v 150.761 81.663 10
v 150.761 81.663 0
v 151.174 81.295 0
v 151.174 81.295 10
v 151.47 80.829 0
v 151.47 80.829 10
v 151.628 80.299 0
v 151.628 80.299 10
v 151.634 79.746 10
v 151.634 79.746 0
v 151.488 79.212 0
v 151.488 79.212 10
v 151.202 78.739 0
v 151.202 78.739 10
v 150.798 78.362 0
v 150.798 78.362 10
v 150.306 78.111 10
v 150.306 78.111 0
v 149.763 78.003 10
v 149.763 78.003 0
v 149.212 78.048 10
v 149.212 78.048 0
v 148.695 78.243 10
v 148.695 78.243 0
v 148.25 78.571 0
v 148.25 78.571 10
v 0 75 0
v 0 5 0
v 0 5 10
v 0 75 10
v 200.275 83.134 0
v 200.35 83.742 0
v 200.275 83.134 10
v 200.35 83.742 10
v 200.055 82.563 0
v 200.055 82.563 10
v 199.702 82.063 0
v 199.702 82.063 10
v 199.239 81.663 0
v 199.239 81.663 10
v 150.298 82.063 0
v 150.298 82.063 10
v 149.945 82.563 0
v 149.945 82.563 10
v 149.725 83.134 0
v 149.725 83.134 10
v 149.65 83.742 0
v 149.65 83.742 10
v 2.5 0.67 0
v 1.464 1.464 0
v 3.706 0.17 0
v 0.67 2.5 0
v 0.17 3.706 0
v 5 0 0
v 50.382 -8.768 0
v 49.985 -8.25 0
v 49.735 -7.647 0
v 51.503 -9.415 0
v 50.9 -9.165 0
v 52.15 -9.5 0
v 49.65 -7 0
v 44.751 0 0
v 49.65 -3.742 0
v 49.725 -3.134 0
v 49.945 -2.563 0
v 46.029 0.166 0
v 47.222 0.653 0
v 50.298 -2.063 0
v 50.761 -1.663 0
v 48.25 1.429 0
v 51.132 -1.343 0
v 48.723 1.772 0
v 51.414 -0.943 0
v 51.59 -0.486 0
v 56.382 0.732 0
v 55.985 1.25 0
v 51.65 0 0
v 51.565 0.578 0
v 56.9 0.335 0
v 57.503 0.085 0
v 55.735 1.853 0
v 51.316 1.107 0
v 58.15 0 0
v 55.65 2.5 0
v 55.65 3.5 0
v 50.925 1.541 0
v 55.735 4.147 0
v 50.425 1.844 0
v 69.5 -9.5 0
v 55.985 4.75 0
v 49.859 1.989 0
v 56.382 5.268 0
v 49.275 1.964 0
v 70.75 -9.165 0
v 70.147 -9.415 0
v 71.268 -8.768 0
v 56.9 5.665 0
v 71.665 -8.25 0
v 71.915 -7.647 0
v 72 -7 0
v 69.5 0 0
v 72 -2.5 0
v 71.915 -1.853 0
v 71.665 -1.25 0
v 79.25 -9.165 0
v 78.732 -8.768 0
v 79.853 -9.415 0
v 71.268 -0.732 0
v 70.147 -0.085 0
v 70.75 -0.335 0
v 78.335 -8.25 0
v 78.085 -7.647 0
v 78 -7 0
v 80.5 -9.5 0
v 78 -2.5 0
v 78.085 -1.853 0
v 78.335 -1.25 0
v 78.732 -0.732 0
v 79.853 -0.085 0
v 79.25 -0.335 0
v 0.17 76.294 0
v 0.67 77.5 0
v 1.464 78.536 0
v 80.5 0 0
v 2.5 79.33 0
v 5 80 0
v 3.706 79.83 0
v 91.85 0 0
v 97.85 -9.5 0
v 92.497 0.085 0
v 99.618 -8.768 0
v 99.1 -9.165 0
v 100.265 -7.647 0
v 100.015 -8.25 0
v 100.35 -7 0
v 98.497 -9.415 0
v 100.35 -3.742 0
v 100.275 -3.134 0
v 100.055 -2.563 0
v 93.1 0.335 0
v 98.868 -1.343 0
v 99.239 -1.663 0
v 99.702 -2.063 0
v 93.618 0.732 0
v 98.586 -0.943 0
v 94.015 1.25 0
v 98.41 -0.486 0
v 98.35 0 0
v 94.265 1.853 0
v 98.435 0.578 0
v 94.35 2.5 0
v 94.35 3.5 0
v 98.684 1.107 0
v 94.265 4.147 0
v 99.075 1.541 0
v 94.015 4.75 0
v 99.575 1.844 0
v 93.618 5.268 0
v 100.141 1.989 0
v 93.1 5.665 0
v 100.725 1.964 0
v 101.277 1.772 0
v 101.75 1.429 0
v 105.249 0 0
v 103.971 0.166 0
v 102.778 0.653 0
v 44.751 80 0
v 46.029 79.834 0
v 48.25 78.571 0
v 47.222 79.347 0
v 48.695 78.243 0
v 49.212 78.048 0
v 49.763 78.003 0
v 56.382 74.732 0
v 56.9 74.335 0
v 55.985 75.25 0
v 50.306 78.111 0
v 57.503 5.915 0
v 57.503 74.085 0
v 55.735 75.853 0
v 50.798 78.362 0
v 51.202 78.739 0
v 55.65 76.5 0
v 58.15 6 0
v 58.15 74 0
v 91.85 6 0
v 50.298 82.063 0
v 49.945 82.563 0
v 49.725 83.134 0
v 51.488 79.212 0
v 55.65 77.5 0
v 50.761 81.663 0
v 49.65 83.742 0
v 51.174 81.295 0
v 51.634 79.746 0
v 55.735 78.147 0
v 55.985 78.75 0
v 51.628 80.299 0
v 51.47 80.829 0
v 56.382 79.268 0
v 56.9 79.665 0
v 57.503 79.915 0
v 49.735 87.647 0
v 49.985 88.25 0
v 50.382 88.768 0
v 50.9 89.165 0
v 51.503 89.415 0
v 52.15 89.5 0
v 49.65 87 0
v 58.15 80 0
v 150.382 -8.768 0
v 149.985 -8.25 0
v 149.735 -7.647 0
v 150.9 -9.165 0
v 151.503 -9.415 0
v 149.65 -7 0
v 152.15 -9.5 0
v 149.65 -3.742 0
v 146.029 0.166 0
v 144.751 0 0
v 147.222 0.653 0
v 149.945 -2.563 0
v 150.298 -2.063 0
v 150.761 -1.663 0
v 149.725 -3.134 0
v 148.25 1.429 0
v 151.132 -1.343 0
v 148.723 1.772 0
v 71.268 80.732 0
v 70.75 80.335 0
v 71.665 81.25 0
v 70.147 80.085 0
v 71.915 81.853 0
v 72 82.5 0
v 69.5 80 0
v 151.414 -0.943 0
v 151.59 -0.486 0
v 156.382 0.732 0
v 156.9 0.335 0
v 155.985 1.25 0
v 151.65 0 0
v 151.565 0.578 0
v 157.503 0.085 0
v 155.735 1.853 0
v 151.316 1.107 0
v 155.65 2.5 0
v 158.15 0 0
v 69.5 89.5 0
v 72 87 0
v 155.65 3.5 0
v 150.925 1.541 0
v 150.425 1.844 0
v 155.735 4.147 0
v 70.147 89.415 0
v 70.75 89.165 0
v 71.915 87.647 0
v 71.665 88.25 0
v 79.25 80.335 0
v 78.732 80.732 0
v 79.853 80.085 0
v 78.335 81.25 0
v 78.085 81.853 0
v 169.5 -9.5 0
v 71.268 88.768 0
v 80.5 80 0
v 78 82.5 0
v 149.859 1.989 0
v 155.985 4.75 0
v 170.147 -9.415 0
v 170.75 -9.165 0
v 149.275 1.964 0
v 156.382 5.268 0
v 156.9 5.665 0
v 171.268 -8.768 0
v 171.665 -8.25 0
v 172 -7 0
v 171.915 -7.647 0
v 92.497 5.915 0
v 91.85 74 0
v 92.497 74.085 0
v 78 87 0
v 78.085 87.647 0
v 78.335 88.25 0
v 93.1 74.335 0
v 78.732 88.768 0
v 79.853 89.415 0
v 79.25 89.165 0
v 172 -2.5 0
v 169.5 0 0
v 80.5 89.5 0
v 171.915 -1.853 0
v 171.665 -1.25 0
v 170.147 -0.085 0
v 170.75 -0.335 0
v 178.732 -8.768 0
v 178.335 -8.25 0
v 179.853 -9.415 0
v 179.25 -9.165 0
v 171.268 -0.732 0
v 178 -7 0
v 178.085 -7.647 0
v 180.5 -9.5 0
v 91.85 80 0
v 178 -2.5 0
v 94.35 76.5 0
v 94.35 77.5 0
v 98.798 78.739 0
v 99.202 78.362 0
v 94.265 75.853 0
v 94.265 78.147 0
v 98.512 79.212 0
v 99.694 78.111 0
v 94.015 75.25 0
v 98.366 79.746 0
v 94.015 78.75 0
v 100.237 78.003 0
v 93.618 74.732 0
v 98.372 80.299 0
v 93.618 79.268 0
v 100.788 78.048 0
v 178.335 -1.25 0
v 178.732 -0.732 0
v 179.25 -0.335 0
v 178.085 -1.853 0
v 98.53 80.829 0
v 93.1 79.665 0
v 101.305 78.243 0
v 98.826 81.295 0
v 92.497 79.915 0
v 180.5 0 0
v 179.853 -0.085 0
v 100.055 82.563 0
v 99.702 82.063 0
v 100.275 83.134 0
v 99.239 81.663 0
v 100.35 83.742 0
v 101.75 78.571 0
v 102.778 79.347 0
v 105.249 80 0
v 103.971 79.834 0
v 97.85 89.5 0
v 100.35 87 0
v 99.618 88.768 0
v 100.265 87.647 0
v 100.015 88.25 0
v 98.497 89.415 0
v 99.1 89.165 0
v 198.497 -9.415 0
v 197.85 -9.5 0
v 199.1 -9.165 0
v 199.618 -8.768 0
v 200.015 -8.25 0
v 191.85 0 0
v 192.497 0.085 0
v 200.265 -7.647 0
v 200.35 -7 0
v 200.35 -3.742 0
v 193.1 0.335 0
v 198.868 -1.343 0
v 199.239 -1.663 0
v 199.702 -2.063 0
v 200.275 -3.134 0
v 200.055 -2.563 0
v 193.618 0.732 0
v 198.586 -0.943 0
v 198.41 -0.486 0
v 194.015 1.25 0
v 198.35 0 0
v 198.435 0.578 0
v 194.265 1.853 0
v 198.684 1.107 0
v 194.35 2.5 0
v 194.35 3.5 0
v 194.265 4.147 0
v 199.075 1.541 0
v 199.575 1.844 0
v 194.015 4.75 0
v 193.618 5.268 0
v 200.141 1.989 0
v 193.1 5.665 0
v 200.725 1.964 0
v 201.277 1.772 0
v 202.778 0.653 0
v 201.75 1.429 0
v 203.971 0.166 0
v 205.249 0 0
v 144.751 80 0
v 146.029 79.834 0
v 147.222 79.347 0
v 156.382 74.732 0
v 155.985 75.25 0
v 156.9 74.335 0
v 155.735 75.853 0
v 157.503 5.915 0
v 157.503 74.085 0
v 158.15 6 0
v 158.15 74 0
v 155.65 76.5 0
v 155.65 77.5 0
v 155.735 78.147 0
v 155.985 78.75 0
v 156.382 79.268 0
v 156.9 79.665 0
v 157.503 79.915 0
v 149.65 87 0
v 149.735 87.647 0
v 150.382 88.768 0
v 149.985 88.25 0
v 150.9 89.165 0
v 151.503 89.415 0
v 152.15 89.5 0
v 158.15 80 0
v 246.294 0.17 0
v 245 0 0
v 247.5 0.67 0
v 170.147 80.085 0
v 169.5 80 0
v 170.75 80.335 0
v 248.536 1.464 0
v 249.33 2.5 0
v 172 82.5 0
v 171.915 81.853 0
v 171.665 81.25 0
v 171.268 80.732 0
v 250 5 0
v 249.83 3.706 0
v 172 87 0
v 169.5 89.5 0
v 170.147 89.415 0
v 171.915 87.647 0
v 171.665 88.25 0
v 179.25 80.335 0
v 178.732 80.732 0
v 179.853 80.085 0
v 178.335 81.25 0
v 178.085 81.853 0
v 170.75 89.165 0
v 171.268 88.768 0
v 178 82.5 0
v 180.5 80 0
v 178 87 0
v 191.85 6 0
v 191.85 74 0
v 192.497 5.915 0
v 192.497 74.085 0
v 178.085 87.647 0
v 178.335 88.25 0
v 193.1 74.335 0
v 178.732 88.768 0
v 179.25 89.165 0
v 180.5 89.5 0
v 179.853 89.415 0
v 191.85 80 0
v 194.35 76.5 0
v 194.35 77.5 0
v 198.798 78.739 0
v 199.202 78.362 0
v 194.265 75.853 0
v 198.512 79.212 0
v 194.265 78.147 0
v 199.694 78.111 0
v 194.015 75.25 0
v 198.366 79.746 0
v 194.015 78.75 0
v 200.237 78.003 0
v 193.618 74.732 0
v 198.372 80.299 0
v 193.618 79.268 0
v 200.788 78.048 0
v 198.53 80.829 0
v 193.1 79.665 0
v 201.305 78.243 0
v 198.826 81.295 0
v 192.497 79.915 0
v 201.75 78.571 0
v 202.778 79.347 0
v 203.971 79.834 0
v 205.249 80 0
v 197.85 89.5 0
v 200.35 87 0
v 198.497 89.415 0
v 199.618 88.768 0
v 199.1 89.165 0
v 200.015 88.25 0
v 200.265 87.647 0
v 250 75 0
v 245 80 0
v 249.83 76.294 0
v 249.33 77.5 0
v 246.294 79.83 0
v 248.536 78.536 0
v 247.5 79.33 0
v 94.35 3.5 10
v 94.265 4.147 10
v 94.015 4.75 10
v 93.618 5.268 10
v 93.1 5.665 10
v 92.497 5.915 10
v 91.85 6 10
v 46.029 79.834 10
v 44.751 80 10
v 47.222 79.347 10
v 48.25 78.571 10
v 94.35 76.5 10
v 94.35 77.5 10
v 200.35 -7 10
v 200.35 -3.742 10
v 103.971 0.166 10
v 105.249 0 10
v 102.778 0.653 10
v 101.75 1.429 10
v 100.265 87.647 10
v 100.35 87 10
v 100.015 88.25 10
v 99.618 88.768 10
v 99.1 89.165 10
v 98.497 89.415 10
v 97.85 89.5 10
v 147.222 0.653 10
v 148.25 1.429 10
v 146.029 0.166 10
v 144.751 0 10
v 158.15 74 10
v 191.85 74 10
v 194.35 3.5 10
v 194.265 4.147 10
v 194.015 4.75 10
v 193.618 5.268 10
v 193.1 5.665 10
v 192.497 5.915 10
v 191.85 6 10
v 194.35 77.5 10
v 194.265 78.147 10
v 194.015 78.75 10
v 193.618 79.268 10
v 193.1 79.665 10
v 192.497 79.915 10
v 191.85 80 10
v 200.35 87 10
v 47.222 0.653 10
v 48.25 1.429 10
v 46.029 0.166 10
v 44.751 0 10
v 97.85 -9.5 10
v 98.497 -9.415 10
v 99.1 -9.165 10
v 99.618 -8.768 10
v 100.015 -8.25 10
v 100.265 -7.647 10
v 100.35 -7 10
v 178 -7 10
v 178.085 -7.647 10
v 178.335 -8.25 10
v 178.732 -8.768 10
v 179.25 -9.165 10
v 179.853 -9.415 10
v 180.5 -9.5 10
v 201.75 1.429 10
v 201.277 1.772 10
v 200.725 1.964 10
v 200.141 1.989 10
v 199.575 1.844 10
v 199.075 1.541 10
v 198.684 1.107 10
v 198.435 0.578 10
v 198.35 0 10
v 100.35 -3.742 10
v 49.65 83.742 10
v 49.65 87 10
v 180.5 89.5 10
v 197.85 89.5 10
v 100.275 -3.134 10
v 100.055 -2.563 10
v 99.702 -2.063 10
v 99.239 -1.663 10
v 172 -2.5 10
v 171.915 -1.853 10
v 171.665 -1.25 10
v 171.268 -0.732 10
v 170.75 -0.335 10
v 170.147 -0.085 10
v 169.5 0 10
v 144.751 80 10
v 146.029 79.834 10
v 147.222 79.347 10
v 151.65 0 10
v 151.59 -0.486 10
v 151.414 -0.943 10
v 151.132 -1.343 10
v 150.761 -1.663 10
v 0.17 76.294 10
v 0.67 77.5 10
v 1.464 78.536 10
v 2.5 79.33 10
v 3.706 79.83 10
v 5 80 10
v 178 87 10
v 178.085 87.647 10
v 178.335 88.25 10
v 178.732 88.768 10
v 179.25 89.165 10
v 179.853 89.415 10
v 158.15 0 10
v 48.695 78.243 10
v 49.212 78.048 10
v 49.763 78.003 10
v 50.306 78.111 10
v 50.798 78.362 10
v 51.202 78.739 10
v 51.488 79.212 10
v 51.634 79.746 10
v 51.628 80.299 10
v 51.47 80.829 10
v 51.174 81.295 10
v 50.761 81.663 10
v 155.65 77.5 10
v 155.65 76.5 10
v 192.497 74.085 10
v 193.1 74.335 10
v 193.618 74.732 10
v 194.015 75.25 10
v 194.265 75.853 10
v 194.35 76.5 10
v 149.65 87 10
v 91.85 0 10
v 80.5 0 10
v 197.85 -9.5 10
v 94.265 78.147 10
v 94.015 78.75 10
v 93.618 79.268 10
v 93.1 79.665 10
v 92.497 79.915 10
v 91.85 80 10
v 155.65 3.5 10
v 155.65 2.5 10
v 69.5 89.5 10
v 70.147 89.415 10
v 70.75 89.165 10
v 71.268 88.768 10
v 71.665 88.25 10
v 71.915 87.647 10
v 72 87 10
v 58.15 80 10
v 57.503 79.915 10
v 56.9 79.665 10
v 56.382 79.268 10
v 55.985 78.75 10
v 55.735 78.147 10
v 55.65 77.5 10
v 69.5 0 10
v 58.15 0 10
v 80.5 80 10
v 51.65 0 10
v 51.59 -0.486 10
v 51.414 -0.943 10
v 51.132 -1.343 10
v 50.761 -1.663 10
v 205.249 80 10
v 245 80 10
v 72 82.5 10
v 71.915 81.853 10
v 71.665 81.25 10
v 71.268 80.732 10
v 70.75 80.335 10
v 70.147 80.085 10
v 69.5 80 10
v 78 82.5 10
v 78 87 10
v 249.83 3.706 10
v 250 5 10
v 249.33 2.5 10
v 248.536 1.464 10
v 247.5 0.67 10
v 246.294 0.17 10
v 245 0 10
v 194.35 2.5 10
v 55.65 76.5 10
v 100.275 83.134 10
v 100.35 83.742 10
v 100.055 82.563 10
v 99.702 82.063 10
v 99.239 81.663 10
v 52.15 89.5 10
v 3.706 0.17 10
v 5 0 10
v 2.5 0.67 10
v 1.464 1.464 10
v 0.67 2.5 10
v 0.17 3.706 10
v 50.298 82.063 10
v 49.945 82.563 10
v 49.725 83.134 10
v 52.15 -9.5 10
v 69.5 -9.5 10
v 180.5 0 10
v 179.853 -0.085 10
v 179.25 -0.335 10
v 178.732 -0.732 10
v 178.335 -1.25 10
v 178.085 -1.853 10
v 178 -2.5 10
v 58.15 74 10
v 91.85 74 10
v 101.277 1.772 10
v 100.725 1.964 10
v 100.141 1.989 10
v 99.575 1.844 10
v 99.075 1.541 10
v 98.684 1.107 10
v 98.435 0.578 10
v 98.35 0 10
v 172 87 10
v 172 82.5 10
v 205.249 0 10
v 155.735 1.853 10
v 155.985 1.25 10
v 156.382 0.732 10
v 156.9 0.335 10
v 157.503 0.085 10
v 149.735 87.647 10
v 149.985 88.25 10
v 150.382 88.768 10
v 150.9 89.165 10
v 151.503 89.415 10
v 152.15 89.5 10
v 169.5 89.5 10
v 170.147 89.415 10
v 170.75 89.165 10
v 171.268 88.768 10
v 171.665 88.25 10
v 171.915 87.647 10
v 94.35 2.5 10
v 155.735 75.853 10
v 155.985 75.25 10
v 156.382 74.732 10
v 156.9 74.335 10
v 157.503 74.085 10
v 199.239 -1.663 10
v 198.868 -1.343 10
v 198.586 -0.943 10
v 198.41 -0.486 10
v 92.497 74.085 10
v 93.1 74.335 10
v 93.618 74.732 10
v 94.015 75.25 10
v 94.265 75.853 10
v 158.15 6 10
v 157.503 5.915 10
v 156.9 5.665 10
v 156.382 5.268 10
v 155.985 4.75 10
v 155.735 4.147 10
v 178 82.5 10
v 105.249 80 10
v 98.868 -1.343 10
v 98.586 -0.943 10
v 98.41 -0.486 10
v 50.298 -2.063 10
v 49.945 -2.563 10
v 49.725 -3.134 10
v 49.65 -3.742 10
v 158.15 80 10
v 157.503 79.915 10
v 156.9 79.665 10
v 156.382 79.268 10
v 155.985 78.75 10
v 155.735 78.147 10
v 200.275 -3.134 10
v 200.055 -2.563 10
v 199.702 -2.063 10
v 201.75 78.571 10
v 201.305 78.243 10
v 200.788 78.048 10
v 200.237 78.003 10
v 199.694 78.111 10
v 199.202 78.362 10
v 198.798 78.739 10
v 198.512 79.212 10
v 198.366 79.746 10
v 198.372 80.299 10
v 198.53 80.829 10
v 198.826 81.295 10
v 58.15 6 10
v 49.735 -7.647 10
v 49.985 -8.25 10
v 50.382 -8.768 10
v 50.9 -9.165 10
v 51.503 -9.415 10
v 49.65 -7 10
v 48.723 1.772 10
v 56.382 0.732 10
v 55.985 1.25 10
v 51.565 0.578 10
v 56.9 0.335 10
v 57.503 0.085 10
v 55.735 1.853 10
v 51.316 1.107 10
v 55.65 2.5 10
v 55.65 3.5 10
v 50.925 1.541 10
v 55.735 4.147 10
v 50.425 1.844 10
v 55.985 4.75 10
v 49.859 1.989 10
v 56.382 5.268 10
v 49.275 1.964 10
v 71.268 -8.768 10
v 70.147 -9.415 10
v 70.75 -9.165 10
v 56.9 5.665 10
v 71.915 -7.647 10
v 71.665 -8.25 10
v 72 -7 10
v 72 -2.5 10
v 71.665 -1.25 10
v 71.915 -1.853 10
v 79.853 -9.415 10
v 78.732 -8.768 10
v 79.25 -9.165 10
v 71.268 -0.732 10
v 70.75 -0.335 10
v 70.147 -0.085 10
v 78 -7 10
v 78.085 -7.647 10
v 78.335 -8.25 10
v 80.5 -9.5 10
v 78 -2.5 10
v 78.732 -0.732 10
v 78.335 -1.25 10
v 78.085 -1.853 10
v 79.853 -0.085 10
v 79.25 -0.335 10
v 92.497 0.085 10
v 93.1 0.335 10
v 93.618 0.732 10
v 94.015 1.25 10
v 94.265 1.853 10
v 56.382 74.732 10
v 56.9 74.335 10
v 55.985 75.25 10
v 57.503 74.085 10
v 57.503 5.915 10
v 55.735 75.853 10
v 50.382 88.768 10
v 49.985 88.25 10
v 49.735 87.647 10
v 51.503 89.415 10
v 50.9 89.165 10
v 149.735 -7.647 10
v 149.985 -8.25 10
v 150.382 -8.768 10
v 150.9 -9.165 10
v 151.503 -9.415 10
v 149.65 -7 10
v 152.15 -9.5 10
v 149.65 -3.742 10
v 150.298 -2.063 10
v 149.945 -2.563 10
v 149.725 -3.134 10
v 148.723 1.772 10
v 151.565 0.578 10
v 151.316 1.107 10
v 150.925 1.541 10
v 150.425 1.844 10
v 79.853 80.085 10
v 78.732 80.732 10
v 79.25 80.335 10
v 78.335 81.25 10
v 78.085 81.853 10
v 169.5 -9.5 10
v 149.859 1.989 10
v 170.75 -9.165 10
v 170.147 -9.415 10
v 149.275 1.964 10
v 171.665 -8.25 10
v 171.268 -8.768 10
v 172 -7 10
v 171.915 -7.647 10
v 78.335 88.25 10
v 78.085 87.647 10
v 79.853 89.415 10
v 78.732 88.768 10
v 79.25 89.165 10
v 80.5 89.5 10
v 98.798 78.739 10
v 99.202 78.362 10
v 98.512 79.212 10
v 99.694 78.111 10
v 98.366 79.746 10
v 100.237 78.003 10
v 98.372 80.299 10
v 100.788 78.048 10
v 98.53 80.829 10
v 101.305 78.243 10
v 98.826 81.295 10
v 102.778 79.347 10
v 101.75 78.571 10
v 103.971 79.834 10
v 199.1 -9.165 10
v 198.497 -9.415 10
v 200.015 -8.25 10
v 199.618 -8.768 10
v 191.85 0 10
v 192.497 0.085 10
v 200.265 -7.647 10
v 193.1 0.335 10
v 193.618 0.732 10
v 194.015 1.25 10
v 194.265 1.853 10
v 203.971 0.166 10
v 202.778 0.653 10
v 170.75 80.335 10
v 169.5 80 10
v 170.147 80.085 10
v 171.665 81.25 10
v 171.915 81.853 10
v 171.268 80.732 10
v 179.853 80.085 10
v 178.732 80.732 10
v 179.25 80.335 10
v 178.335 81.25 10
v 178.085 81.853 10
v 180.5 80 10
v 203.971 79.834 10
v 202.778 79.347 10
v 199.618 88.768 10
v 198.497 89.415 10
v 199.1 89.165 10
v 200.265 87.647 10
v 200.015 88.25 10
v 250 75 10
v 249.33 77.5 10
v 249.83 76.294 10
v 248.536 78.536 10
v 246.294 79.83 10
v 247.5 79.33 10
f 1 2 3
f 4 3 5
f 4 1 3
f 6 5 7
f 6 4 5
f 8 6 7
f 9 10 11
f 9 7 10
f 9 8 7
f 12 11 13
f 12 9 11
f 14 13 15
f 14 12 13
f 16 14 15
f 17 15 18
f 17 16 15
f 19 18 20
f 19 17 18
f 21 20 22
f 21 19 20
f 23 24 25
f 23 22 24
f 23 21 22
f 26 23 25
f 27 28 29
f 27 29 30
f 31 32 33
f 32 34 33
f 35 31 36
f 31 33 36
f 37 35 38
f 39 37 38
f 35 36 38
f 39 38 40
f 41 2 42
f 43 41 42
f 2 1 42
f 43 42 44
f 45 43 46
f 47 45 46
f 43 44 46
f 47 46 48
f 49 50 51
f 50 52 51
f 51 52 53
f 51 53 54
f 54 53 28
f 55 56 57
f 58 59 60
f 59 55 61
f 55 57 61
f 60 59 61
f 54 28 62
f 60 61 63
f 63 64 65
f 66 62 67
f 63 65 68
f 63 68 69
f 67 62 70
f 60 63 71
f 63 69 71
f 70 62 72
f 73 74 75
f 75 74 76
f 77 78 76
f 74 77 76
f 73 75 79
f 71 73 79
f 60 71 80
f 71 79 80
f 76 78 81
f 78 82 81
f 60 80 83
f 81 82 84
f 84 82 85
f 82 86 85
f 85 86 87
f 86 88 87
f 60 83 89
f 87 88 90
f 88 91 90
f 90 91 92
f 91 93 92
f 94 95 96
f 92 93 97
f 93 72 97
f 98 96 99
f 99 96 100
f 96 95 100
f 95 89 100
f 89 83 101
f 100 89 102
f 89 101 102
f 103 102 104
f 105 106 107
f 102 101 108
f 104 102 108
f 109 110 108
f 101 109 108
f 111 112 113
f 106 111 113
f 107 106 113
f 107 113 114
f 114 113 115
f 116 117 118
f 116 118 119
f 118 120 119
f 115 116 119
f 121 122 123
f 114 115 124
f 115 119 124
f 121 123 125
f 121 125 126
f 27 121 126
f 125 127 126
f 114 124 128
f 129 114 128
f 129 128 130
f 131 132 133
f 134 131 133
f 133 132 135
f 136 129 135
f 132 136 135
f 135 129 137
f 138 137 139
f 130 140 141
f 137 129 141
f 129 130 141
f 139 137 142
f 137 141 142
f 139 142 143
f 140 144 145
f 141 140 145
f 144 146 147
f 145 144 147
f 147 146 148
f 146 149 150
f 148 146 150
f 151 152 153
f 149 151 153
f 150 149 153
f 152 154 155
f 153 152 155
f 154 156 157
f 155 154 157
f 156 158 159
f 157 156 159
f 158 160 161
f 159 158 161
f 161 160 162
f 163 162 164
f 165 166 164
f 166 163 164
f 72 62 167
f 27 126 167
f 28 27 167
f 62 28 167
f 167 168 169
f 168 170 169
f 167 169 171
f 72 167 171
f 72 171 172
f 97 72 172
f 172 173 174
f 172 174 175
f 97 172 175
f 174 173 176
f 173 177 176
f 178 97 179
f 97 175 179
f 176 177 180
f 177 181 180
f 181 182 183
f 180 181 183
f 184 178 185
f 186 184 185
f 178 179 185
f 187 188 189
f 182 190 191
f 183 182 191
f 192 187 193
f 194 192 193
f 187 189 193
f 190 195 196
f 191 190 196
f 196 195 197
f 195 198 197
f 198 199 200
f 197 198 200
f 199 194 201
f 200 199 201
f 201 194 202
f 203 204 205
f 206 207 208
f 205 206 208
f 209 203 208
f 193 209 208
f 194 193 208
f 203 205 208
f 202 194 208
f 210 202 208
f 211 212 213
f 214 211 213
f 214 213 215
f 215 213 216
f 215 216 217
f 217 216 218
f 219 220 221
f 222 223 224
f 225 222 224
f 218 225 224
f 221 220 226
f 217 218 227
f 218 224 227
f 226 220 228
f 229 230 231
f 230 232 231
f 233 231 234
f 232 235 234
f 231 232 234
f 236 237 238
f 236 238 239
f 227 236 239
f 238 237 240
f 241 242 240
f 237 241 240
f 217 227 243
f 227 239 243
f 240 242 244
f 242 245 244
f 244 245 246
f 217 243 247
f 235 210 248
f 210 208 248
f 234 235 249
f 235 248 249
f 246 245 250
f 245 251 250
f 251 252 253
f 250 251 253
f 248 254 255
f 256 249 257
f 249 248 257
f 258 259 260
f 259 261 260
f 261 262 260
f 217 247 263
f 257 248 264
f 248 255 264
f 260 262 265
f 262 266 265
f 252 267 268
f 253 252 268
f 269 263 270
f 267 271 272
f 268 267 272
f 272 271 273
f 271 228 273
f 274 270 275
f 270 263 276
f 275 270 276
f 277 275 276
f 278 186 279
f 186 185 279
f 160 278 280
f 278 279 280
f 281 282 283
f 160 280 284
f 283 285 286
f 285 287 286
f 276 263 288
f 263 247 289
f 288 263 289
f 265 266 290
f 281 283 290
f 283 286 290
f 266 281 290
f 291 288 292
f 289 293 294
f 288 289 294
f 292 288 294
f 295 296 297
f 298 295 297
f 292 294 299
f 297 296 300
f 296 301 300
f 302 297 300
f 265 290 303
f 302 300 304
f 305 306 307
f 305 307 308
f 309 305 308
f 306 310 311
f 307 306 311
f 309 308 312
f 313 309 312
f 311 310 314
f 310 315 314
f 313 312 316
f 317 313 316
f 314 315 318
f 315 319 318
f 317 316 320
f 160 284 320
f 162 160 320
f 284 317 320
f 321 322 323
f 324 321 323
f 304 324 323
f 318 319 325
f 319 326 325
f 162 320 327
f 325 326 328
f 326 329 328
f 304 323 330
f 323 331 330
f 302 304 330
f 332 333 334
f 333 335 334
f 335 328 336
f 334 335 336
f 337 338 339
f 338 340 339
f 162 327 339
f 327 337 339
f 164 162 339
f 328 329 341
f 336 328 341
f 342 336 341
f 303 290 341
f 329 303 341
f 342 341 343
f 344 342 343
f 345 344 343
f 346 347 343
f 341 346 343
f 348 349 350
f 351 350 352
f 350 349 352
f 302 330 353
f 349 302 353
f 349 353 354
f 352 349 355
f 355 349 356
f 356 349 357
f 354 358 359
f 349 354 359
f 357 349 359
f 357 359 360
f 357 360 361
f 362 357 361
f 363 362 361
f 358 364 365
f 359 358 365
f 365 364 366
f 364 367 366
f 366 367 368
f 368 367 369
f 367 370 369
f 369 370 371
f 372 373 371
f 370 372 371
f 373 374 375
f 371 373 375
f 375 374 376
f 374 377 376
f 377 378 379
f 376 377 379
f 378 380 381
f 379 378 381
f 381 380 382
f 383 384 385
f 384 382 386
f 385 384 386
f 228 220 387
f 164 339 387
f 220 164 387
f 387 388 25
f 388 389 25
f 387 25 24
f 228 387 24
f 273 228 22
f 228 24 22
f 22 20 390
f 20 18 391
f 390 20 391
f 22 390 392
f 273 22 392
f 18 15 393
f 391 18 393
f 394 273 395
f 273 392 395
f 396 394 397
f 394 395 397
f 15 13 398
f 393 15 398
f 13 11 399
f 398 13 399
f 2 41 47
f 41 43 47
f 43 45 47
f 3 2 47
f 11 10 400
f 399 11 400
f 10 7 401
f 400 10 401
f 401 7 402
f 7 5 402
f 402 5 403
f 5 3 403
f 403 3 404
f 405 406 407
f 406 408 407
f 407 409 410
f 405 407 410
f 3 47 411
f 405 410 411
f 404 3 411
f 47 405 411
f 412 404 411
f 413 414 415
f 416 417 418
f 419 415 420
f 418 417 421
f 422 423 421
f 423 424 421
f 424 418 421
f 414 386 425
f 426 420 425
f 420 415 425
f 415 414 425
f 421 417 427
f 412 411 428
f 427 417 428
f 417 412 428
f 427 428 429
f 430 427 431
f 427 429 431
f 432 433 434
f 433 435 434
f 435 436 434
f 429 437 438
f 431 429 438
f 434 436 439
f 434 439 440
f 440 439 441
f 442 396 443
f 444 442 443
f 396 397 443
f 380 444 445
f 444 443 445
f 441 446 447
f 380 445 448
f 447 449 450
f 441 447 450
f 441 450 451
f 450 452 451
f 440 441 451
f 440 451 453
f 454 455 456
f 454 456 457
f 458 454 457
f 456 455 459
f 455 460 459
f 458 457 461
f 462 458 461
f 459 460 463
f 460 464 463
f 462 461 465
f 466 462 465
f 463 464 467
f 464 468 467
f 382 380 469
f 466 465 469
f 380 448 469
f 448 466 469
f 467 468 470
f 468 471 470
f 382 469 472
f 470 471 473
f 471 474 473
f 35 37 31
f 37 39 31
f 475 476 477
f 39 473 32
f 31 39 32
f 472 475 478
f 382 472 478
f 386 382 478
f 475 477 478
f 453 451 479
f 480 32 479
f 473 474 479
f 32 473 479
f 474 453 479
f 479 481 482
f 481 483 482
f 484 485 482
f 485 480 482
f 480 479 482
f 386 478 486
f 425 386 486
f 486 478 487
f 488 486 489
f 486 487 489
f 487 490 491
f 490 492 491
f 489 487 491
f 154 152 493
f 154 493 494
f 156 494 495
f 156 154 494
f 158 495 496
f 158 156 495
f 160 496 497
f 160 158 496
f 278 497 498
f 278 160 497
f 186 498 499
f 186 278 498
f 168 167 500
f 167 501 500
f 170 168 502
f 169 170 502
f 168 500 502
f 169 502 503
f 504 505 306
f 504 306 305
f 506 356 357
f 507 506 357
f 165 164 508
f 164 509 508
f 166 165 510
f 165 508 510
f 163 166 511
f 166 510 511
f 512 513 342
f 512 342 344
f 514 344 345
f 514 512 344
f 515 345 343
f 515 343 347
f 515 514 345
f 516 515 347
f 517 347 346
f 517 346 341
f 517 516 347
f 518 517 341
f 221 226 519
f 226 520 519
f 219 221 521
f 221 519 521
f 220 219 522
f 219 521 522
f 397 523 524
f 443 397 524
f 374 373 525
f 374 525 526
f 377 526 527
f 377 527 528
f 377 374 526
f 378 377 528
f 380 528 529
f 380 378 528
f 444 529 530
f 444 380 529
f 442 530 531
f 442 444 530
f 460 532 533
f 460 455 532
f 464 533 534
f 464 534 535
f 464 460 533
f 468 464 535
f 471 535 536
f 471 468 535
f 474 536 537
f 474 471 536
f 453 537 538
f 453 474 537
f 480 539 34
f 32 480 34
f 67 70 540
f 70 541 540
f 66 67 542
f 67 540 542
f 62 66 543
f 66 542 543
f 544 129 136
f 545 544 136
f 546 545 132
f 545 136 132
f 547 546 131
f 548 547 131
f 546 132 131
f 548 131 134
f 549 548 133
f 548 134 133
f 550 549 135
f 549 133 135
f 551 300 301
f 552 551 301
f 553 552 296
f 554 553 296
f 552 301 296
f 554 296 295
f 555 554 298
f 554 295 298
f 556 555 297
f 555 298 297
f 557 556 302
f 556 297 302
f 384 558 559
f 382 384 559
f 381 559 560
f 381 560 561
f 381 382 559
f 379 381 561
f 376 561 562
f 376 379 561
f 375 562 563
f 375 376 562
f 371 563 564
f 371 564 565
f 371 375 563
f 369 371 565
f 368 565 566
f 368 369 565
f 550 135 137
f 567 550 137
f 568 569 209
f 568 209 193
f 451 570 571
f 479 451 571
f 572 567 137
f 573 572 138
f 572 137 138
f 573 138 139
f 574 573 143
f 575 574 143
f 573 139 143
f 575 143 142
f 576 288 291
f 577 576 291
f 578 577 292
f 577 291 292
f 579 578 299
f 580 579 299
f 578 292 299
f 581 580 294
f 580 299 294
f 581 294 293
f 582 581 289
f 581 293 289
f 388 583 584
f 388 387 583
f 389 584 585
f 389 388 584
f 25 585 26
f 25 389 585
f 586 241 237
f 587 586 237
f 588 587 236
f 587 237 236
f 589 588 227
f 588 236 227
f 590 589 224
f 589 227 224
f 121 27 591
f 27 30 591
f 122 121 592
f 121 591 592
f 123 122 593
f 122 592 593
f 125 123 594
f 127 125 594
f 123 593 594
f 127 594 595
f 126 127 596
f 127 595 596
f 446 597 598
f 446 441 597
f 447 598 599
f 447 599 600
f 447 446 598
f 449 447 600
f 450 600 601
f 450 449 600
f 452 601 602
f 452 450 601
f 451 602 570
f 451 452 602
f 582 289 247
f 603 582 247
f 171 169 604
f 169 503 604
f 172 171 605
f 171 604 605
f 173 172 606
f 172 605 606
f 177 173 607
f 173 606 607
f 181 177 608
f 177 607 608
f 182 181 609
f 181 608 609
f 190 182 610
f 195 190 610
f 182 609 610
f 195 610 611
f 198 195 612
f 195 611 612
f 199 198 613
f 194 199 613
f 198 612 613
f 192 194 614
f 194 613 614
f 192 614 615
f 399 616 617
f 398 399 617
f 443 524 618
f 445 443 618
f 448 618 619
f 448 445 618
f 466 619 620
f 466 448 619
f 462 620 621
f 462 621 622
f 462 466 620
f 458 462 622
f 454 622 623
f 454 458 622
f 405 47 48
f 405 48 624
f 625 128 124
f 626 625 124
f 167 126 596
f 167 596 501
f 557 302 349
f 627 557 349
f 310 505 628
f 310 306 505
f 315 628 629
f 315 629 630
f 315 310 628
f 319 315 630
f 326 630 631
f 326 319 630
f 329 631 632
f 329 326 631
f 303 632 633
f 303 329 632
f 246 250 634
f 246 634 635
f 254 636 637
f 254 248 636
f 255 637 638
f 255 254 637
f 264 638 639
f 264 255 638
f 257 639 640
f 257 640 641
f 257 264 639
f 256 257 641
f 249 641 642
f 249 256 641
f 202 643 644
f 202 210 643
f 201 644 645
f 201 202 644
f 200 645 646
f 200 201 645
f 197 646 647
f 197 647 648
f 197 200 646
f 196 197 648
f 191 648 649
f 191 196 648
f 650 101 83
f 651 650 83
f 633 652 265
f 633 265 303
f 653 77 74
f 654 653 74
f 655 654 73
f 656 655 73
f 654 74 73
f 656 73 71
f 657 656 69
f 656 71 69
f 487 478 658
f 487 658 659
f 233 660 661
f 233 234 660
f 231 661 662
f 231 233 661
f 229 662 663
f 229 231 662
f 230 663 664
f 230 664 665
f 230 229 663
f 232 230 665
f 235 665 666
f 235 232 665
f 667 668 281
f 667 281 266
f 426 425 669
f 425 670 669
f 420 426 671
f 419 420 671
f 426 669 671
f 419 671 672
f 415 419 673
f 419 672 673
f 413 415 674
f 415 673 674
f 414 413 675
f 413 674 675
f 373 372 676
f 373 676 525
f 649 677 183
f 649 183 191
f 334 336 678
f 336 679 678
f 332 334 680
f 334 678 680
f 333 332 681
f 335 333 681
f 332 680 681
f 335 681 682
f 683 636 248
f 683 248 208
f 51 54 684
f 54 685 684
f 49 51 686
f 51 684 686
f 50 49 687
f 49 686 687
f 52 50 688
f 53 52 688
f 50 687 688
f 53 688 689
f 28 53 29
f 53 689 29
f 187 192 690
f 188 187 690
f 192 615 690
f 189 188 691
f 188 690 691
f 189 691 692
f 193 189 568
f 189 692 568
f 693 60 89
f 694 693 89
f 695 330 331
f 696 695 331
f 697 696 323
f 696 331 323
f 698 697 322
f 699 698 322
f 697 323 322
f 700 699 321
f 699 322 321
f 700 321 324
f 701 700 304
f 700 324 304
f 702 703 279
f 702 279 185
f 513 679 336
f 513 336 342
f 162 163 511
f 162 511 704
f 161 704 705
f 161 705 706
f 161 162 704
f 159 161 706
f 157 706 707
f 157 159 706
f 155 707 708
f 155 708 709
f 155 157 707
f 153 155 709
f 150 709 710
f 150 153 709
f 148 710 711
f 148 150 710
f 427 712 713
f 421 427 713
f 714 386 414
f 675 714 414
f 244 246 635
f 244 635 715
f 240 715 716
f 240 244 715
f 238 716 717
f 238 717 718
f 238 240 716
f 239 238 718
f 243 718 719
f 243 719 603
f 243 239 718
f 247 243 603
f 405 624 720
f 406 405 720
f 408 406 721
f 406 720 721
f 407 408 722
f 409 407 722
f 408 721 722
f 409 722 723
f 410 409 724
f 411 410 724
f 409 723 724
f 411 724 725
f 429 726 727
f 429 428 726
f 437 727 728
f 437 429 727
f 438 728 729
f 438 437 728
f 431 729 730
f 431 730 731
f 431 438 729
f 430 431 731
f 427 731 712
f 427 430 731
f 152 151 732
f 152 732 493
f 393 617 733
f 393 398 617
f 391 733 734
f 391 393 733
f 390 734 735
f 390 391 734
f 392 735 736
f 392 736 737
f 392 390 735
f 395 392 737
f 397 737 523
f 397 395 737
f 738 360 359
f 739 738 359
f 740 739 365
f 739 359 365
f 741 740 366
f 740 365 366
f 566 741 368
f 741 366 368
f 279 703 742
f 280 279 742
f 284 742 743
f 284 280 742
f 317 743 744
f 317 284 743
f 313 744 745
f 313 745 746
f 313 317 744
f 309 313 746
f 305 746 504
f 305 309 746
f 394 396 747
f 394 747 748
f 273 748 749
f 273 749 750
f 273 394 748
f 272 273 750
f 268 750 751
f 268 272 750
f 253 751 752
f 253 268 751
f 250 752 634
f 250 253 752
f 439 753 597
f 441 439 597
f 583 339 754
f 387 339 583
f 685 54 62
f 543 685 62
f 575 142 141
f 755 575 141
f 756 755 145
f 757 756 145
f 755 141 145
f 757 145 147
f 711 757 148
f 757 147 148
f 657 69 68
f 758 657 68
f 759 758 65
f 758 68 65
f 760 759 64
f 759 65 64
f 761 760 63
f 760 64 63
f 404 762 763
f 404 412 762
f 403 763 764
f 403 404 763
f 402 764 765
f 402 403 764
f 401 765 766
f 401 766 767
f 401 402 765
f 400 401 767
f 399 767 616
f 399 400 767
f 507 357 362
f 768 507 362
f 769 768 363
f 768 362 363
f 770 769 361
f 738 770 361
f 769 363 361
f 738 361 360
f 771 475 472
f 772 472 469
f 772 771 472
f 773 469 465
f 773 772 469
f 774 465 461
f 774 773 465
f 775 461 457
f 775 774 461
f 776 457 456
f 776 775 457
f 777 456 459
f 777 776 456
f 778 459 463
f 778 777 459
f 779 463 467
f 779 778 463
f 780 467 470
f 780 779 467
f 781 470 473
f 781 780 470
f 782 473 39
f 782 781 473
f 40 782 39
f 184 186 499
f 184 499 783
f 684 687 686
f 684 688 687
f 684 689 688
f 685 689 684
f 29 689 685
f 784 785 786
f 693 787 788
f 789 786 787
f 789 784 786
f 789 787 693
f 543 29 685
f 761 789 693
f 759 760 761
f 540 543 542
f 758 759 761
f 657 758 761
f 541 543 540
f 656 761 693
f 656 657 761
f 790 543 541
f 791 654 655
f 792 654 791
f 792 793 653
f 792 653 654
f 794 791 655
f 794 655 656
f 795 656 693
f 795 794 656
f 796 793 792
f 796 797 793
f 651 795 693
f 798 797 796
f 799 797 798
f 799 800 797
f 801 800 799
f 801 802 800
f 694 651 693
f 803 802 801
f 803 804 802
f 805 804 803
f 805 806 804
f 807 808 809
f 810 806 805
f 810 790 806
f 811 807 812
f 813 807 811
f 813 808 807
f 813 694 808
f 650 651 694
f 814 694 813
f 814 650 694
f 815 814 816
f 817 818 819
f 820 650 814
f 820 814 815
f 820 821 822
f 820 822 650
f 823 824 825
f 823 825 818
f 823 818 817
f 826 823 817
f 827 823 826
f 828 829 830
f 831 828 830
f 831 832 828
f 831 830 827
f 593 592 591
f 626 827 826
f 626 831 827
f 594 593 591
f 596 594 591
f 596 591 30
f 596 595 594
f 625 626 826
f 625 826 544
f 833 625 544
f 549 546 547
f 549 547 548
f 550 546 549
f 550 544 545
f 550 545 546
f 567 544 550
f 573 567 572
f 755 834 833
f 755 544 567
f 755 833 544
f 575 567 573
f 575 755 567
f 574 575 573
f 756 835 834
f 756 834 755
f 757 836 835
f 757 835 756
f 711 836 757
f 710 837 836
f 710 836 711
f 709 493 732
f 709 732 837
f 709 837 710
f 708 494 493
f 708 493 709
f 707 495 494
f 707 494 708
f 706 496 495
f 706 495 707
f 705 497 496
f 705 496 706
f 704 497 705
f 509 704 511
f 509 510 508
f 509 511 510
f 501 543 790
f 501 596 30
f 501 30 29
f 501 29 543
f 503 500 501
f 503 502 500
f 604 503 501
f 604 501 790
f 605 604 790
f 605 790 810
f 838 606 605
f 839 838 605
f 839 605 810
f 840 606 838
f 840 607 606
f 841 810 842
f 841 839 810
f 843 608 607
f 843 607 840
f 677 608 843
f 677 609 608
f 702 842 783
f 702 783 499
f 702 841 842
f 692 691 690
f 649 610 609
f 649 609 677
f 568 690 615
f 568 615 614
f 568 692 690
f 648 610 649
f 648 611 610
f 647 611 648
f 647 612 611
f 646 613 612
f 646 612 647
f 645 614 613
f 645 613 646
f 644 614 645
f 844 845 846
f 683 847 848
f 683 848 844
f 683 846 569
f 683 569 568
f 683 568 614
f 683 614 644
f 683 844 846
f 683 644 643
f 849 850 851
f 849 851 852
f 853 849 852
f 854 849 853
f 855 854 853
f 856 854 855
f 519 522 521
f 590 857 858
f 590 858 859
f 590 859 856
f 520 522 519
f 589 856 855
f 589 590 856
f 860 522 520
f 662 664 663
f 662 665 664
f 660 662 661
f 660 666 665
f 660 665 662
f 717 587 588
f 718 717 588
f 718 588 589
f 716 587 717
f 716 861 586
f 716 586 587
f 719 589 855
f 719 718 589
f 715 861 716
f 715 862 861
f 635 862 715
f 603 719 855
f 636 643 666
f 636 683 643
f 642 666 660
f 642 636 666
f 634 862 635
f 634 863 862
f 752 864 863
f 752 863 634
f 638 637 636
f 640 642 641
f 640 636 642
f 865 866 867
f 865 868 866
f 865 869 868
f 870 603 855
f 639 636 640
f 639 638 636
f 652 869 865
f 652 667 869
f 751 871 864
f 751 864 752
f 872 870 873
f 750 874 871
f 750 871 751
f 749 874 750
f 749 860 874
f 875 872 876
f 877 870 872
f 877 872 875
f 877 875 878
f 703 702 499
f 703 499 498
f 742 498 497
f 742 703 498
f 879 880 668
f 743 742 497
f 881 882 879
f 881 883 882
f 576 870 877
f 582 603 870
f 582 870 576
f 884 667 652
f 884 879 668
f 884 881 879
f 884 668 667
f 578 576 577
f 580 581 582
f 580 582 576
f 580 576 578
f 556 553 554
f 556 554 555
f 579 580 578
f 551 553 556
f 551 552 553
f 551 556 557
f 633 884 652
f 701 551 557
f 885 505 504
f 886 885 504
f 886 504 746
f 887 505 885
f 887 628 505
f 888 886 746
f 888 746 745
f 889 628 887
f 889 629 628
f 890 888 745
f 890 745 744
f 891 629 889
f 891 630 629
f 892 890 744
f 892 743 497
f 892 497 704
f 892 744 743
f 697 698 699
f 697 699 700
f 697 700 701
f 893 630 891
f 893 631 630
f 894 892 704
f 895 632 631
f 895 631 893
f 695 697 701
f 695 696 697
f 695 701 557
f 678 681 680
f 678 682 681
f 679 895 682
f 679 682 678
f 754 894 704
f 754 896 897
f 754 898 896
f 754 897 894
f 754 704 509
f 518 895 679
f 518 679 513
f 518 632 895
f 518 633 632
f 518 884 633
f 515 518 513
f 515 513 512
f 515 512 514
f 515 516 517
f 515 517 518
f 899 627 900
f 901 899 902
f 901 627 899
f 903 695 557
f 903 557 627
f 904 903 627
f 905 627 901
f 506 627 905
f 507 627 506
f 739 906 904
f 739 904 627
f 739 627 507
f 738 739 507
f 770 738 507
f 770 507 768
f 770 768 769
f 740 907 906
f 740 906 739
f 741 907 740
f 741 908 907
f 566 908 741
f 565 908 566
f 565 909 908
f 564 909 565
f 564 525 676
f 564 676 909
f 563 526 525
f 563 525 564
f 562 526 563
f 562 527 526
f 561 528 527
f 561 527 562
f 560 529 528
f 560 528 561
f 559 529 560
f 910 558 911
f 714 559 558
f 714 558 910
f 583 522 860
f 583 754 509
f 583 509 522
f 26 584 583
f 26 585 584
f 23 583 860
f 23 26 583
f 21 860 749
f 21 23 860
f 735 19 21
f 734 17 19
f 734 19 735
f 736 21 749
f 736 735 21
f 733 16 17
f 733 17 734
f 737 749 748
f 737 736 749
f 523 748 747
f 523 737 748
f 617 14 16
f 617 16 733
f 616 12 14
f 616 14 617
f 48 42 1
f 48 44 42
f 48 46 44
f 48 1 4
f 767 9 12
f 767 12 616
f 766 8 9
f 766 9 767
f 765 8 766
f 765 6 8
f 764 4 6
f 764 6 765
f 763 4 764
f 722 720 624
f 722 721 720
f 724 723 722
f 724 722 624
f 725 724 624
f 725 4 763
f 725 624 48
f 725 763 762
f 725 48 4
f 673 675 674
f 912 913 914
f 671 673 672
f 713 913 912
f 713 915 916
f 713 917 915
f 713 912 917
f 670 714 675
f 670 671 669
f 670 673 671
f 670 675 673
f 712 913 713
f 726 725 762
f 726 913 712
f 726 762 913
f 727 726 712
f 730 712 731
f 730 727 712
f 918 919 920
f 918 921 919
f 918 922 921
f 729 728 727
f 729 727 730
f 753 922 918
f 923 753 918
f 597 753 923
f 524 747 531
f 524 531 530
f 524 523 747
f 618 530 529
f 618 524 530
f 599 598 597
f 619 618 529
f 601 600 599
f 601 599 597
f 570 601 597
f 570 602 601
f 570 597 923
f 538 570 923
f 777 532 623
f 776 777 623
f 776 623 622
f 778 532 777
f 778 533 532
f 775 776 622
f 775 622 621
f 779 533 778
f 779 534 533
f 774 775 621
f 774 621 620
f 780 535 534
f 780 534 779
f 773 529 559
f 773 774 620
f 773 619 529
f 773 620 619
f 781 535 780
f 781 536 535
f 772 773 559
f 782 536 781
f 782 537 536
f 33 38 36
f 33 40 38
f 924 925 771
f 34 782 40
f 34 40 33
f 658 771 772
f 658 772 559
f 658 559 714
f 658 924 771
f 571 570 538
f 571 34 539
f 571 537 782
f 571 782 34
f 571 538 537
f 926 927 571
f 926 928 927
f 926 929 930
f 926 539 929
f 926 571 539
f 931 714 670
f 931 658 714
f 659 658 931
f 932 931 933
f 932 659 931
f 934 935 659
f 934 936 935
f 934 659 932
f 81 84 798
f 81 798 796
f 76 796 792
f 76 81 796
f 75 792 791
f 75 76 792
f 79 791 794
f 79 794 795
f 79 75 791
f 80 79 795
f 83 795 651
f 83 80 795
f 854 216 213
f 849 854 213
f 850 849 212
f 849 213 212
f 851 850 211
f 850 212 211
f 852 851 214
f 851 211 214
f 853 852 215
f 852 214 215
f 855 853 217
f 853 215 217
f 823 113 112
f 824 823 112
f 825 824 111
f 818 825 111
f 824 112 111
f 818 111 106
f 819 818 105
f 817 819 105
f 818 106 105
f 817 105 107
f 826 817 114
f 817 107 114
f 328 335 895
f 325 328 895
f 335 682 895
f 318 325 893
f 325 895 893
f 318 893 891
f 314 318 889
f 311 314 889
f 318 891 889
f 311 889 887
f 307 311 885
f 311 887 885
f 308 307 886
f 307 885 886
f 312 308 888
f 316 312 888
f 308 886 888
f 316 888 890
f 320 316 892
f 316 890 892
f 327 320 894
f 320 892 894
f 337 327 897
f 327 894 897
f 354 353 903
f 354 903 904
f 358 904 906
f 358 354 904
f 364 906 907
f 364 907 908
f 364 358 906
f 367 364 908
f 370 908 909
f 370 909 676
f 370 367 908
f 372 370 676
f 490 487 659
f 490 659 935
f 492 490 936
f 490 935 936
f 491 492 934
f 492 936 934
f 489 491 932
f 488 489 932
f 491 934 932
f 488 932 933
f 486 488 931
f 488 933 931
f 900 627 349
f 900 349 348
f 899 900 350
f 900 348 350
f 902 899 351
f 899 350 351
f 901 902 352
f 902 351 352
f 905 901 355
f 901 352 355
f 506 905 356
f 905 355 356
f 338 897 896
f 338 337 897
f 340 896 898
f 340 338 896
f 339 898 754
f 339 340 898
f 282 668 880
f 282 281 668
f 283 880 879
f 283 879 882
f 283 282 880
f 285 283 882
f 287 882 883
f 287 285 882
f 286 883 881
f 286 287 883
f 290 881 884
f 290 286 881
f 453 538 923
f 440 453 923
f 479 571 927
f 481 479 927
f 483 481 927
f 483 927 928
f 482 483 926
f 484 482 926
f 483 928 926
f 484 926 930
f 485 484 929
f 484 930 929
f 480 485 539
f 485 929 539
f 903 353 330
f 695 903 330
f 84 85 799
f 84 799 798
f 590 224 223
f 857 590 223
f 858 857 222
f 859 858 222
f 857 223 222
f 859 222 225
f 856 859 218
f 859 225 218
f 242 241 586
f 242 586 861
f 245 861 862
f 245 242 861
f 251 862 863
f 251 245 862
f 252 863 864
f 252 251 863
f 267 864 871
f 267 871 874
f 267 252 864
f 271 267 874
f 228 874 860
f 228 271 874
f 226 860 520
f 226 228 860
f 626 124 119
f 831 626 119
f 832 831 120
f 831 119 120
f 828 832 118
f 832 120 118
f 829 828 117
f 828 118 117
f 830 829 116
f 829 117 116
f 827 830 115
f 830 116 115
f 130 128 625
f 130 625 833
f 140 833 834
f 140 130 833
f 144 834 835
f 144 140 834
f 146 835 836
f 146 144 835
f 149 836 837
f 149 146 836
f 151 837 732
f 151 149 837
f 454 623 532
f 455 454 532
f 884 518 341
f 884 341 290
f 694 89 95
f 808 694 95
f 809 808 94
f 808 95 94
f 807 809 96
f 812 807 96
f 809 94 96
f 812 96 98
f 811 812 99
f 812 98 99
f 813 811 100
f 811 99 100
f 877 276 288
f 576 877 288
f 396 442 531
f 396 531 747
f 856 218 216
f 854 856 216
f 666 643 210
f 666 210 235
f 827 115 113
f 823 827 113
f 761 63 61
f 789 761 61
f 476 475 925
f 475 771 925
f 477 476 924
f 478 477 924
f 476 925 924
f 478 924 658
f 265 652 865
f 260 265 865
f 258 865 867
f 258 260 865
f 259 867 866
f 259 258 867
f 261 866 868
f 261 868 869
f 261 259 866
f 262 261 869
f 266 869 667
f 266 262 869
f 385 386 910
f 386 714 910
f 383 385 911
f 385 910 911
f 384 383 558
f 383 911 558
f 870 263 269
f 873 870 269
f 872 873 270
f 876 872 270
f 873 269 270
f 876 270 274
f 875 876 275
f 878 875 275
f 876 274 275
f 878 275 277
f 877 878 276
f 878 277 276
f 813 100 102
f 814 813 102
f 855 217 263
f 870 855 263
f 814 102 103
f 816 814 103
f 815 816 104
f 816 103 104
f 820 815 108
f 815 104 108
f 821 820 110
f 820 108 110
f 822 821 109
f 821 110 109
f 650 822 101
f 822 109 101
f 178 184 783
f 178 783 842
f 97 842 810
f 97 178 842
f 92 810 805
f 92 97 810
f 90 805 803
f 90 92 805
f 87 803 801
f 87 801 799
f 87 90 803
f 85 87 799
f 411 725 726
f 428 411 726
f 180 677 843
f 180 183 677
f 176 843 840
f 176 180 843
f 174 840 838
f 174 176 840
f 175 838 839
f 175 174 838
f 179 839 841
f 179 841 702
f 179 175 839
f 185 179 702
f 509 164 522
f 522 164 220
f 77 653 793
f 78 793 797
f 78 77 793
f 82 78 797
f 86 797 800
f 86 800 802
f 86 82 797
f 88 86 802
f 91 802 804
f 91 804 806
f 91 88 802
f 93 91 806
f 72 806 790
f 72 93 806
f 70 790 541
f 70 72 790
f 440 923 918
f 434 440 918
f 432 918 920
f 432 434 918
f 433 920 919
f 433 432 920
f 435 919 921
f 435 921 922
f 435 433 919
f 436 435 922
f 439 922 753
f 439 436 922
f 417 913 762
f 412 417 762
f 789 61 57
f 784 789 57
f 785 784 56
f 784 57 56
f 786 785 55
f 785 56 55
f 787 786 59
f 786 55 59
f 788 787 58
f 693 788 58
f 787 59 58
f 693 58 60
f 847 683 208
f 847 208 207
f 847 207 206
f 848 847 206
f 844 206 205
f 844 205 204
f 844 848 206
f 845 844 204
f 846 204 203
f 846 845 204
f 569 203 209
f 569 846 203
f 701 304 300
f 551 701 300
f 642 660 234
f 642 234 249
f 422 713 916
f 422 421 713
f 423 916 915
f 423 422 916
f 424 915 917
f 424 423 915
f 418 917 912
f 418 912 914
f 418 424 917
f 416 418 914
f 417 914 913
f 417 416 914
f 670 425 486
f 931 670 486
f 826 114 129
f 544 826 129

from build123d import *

# Parameters (mm, degrees)
SKETCH1_W            = 250
SKETCH1_H            = 80
BOSS_EXTRUDE1_DEPTH  = 10
BOSS_EXTRUDE2_DEPTH  = 10
SKETCH3_R            = 2
CUT_EXTRUDE1_DEPTH   = 266.725892604
FILLET1_R            = 2.5
FILLET1_OF_MIRROR1_R = 2.5
MIRROR3_DEPTH        = 10
MIRROR3_2_DEPTH      = 10
FILLET2_R            = 5


# Read off the part's stored shape, not the designer's step: Mirror3
with BuildPart() as part:
    # Sketch1 → Boss-Extrude1 (new body)
    with BuildSketch(Plane.XY):
        with Locations((125, 40)):
            Rectangle(SKETCH1_W, SKETCH1_H)
    extrude(amount=BOSS_EXTRUDE1_DEPTH)

    # Sketch2 → Boss-Extrude2 (add)
    with BuildSketch(Plane.XY.offset(10)):
        with BuildLine():
            Line((49.65, 80), (100.35, 80))
            Line((100.35, 80), (100.35, 87))
            ThreePointArc((100.35, 87), (99.617766953, 88.767766953), (97.85, 89.5))
            Line((97.85, 89.5), (52.15, 89.5))
            ThreePointArc((52.15, 89.5), (50.382233047, 88.767766953), (49.65, 87))
            Line((49.65, 87), (49.65, 80))
        make_face()
    boss_extrude2 = extrude(amount=-BOSS_EXTRUDE2_DEPTH)

    # Sketch3 → Cut-Extrude1 (cut, through all)
    with BuildSketch(Plane.XY.offset(10)):
        with Locations((49.65, 80)):
            Circle(SKETCH3_R)
        with Locations((100.35, 80)):
            Circle(SKETCH3_R)
        Polygon((55.65, 80), (72, 80), (72, 89.5), (78, 89.5), (78, 80), (94.35, 80), (94.35, 74), (55.65, 74), align=None)
    cut_extrude1 = extrude(amount=-CUT_EXTRUDE1_DEPTH, mode=Mode.SUBTRACT)

    # Fillet1
    fillet1_edges = [part.edges().sort_by_distance(p)[0] for p in [
        (49.65, 82, 5),
        (100.35, 82, 5),
        (55.65, 74, 5),
        (55.65, 80, 5),
        (72, 80, 5),
        (72, 89.5, 5),
        (78, 89.5, 5),
        (78, 80, 5),
        (94.35, 80, 5),
        (94.35, 74, 5),
    ]]
    fillet(fillet1_edges, radius=FILLET1_R)

    # Mirror1: Boss-Extrude2, Cut-Extrude1 across plane
    add(boss_extrude2.mirror(Plane.ZY.offset(-125)))
    add(cut_extrude1.mirror(Plane.ZY.offset(-125)), mode=Mode.SUBTRACT)

    # Fillet1 of Mirror1
    fillet1_of_mirror1_edges = [part.edges().sort_by_distance(p)[0] for p in [
        (200.35, 82, 5),
        (149.65, 82, 5),
        (194.35, 74, 5),
        (194.35, 80, 5),
        (178, 80, 5),
        (178, 89.5, 5),
        (172, 89.5, 5),
        (172, 80, 5),
        (155.65, 80, 5),
        (155.65, 74, 5),
    ]]
    fillet(fillet1_of_mirror1_edges, radius=FILLET1_OF_MIRROR1_R)

    # Mirror3 outline → Mirror3 (cut)
    with BuildSketch(Plane.XY):
        with BuildLine():
            Line((47.65, 0), (51.65, 0))
            ThreePointArc((51.65, 0), (49.65, 2), (47.65, 0))
        make_face()
        with BuildLine():
            ThreePointArc((202.35, 0), (200.35, 2), (198.35, 0))
            Line((198.35, 0), (202.35, 0))
        make_face()
        with BuildLine():
            ThreePointArc((151.65, 0), (149.65, 2), (147.65, 0))
            Line((147.65, 0), (151.65, 0))
        make_face()
        with BuildLine():
            ThreePointArc((102.35, 0), (100.35, 2), (98.35, 0))
            Line((98.35, 0), (102.35, 0))
        make_face()
        with BuildLine():
            ThreePointArc((55.65, 2.5), (56.382233047, 0.732233047), (58.15, 0))
            Line((58.15, 0), (91.85, 0))
            ThreePointArc((91.85, 0), (93.617766953, 0.732233047), (94.35, 2.5))
            Line((94.35, 2.5), (94.35, 3.5))
            ThreePointArc((94.35, 3.5), (93.617766953, 5.267766953), (91.85, 6))
            Line((91.85, 6), (58.15, 6))
            ThreePointArc((58.15, 6), (56.382233047, 5.267766953), (55.65, 3.5))
            Line((55.65, 3.5), (55.65, 2.5))
        make_face()
        with BuildLine():
            ThreePointArc((155.65, 2.5), (156.382233047, 0.732233047), (158.15, 0))
            Line((158.15, 0), (191.85, 0))
            ThreePointArc((191.85, 0), (193.617766953, 0.732233047), (194.35, 2.5))
            Line((194.35, 2.5), (194.35, 3.5))
            ThreePointArc((194.35, 3.5), (193.617766953, 5.267766953), (191.85, 6))
            Line((191.85, 6), (158.15, 6))
            ThreePointArc((158.15, 6), (156.382233047, 5.267766953), (155.65, 3.5))
            Line((155.65, 3.5), (155.65, 2.5))
        make_face()
    extrude(amount=MIRROR3_DEPTH, mode=Mode.SUBTRACT)

    # Mirror3 2 outline → Mirror3 2 (add)
    with BuildSketch(Plane.XY):
        with BuildLine():
            Line((169.5, 0), (151.65, 0))
            ThreePointArc((151.65, 0), (151.413834207, -0.942809042), (150.761111111, -1.662958839))
            ThreePointArc((150.761111111, -1.662958839), (149.945207241, -2.563146085), (149.65, -3.741657387))
            Line((149.65, -3.741657387), (149.65, -7))
            ThreePointArc((149.65, -7), (150.382233047, -8.767766953), (152.15, -9.5))
            Line((152.15, -9.5), (169.5, -9.5))
            ThreePointArc((169.5, -9.5), (171.267766953, -8.767766953), (172, -7))
            Line((172, -7), (172, -2.5))
            ThreePointArc((172, -2.5), (171.267766953, -0.732233047), (169.5, 0))
        make_face()
        with BuildLine():
            Line((49.65, -3.741657387), (49.65, -7))
            ThreePointArc((49.65, -7), (50.382233047, -8.767766953), (52.15, -9.5))
            Line((52.15, -9.5), (69.5, -9.5))
            ThreePointArc((69.5, -9.5), (71.267766953, -8.767766953), (72, -7))
            Line((72, -7), (72, -2.5))
            ThreePointArc((72, -2.5), (71.267766953, -0.732233047), (69.5, 0))
            Line((69.5, 0), (51.65, 0))
            ThreePointArc((51.65, 0), (51.413834207, -0.942809042), (50.761111111, -1.662958839))
            ThreePointArc((50.761111111, -1.662958839), (49.945207241, -2.563146085), (49.65, -3.741657387))
        make_face()
        with BuildLine():
            Line((98.35, 0), (80.5, 0))
            ThreePointArc((80.5, 0), (78.732233047, -0.732233047), (78, -2.5))
            Line((78, -2.5), (78, -7))
            ThreePointArc((78, -7), (78.732233047, -8.767766953), (80.5, -9.5))
            Line((80.5, -9.5), (97.85, -9.5))
            ThreePointArc((97.85, -9.5), (99.617766953, -8.767766953), (100.35, -7))
            Line((100.35, -7), (100.35, -3.741657387))
            ThreePointArc((100.35, -3.741657387), (100.054792759, -2.563146085), (99.238888889, -1.662958839))
            ThreePointArc((99.238888889, -1.662958839), (98.586165793, -0.942809042), (98.35, 0))
        make_face()
        with BuildLine():
            Line((198.35, 0), (180.5, 0))
            ThreePointArc((180.5, 0), (178.732233047, -0.732233047), (178, -2.5))
            Line((178, -2.5), (178, -7))
            ThreePointArc((178, -7), (178.732233047, -8.767766953), (180.5, -9.5))
            Line((180.5, -9.5), (197.85, -9.5))
            ThreePointArc((197.85, -9.5), (199.617766953, -8.767766953), (200.35, -7))
            Line((200.35, -7), (200.35, -3.741657387))
            ThreePointArc((200.35, -3.741657387), (200.054792759, -2.563146085), (199.238888889, -1.662958839))
            ThreePointArc((199.238888889, -1.662958839), (198.586165793, -0.942809042), (198.35, 0))
        make_face()
    extrude(amount=MIRROR3_2_DEPTH)

    # Fillet2
    fillet2_edges = [part.edges().sort_by_distance(p)[0] for p in [
        (202.35, 80, 5),
        (147.65, 80, 5),
        (202.35, 0, 5),
        (147.65, 0, 5),
        (47.65, 80, 5),
        (47.65, 0, 5),
        (102.35, 0, 5),
        (102.35, 80, 5),
        (0, 80, 5),
        (250, 80, 5),
        (250, 0, 5),
        (0, 0, 5),
    ]]
    fillet(fillet2_edges, radius=FILLET2_R)


solid = part.part
